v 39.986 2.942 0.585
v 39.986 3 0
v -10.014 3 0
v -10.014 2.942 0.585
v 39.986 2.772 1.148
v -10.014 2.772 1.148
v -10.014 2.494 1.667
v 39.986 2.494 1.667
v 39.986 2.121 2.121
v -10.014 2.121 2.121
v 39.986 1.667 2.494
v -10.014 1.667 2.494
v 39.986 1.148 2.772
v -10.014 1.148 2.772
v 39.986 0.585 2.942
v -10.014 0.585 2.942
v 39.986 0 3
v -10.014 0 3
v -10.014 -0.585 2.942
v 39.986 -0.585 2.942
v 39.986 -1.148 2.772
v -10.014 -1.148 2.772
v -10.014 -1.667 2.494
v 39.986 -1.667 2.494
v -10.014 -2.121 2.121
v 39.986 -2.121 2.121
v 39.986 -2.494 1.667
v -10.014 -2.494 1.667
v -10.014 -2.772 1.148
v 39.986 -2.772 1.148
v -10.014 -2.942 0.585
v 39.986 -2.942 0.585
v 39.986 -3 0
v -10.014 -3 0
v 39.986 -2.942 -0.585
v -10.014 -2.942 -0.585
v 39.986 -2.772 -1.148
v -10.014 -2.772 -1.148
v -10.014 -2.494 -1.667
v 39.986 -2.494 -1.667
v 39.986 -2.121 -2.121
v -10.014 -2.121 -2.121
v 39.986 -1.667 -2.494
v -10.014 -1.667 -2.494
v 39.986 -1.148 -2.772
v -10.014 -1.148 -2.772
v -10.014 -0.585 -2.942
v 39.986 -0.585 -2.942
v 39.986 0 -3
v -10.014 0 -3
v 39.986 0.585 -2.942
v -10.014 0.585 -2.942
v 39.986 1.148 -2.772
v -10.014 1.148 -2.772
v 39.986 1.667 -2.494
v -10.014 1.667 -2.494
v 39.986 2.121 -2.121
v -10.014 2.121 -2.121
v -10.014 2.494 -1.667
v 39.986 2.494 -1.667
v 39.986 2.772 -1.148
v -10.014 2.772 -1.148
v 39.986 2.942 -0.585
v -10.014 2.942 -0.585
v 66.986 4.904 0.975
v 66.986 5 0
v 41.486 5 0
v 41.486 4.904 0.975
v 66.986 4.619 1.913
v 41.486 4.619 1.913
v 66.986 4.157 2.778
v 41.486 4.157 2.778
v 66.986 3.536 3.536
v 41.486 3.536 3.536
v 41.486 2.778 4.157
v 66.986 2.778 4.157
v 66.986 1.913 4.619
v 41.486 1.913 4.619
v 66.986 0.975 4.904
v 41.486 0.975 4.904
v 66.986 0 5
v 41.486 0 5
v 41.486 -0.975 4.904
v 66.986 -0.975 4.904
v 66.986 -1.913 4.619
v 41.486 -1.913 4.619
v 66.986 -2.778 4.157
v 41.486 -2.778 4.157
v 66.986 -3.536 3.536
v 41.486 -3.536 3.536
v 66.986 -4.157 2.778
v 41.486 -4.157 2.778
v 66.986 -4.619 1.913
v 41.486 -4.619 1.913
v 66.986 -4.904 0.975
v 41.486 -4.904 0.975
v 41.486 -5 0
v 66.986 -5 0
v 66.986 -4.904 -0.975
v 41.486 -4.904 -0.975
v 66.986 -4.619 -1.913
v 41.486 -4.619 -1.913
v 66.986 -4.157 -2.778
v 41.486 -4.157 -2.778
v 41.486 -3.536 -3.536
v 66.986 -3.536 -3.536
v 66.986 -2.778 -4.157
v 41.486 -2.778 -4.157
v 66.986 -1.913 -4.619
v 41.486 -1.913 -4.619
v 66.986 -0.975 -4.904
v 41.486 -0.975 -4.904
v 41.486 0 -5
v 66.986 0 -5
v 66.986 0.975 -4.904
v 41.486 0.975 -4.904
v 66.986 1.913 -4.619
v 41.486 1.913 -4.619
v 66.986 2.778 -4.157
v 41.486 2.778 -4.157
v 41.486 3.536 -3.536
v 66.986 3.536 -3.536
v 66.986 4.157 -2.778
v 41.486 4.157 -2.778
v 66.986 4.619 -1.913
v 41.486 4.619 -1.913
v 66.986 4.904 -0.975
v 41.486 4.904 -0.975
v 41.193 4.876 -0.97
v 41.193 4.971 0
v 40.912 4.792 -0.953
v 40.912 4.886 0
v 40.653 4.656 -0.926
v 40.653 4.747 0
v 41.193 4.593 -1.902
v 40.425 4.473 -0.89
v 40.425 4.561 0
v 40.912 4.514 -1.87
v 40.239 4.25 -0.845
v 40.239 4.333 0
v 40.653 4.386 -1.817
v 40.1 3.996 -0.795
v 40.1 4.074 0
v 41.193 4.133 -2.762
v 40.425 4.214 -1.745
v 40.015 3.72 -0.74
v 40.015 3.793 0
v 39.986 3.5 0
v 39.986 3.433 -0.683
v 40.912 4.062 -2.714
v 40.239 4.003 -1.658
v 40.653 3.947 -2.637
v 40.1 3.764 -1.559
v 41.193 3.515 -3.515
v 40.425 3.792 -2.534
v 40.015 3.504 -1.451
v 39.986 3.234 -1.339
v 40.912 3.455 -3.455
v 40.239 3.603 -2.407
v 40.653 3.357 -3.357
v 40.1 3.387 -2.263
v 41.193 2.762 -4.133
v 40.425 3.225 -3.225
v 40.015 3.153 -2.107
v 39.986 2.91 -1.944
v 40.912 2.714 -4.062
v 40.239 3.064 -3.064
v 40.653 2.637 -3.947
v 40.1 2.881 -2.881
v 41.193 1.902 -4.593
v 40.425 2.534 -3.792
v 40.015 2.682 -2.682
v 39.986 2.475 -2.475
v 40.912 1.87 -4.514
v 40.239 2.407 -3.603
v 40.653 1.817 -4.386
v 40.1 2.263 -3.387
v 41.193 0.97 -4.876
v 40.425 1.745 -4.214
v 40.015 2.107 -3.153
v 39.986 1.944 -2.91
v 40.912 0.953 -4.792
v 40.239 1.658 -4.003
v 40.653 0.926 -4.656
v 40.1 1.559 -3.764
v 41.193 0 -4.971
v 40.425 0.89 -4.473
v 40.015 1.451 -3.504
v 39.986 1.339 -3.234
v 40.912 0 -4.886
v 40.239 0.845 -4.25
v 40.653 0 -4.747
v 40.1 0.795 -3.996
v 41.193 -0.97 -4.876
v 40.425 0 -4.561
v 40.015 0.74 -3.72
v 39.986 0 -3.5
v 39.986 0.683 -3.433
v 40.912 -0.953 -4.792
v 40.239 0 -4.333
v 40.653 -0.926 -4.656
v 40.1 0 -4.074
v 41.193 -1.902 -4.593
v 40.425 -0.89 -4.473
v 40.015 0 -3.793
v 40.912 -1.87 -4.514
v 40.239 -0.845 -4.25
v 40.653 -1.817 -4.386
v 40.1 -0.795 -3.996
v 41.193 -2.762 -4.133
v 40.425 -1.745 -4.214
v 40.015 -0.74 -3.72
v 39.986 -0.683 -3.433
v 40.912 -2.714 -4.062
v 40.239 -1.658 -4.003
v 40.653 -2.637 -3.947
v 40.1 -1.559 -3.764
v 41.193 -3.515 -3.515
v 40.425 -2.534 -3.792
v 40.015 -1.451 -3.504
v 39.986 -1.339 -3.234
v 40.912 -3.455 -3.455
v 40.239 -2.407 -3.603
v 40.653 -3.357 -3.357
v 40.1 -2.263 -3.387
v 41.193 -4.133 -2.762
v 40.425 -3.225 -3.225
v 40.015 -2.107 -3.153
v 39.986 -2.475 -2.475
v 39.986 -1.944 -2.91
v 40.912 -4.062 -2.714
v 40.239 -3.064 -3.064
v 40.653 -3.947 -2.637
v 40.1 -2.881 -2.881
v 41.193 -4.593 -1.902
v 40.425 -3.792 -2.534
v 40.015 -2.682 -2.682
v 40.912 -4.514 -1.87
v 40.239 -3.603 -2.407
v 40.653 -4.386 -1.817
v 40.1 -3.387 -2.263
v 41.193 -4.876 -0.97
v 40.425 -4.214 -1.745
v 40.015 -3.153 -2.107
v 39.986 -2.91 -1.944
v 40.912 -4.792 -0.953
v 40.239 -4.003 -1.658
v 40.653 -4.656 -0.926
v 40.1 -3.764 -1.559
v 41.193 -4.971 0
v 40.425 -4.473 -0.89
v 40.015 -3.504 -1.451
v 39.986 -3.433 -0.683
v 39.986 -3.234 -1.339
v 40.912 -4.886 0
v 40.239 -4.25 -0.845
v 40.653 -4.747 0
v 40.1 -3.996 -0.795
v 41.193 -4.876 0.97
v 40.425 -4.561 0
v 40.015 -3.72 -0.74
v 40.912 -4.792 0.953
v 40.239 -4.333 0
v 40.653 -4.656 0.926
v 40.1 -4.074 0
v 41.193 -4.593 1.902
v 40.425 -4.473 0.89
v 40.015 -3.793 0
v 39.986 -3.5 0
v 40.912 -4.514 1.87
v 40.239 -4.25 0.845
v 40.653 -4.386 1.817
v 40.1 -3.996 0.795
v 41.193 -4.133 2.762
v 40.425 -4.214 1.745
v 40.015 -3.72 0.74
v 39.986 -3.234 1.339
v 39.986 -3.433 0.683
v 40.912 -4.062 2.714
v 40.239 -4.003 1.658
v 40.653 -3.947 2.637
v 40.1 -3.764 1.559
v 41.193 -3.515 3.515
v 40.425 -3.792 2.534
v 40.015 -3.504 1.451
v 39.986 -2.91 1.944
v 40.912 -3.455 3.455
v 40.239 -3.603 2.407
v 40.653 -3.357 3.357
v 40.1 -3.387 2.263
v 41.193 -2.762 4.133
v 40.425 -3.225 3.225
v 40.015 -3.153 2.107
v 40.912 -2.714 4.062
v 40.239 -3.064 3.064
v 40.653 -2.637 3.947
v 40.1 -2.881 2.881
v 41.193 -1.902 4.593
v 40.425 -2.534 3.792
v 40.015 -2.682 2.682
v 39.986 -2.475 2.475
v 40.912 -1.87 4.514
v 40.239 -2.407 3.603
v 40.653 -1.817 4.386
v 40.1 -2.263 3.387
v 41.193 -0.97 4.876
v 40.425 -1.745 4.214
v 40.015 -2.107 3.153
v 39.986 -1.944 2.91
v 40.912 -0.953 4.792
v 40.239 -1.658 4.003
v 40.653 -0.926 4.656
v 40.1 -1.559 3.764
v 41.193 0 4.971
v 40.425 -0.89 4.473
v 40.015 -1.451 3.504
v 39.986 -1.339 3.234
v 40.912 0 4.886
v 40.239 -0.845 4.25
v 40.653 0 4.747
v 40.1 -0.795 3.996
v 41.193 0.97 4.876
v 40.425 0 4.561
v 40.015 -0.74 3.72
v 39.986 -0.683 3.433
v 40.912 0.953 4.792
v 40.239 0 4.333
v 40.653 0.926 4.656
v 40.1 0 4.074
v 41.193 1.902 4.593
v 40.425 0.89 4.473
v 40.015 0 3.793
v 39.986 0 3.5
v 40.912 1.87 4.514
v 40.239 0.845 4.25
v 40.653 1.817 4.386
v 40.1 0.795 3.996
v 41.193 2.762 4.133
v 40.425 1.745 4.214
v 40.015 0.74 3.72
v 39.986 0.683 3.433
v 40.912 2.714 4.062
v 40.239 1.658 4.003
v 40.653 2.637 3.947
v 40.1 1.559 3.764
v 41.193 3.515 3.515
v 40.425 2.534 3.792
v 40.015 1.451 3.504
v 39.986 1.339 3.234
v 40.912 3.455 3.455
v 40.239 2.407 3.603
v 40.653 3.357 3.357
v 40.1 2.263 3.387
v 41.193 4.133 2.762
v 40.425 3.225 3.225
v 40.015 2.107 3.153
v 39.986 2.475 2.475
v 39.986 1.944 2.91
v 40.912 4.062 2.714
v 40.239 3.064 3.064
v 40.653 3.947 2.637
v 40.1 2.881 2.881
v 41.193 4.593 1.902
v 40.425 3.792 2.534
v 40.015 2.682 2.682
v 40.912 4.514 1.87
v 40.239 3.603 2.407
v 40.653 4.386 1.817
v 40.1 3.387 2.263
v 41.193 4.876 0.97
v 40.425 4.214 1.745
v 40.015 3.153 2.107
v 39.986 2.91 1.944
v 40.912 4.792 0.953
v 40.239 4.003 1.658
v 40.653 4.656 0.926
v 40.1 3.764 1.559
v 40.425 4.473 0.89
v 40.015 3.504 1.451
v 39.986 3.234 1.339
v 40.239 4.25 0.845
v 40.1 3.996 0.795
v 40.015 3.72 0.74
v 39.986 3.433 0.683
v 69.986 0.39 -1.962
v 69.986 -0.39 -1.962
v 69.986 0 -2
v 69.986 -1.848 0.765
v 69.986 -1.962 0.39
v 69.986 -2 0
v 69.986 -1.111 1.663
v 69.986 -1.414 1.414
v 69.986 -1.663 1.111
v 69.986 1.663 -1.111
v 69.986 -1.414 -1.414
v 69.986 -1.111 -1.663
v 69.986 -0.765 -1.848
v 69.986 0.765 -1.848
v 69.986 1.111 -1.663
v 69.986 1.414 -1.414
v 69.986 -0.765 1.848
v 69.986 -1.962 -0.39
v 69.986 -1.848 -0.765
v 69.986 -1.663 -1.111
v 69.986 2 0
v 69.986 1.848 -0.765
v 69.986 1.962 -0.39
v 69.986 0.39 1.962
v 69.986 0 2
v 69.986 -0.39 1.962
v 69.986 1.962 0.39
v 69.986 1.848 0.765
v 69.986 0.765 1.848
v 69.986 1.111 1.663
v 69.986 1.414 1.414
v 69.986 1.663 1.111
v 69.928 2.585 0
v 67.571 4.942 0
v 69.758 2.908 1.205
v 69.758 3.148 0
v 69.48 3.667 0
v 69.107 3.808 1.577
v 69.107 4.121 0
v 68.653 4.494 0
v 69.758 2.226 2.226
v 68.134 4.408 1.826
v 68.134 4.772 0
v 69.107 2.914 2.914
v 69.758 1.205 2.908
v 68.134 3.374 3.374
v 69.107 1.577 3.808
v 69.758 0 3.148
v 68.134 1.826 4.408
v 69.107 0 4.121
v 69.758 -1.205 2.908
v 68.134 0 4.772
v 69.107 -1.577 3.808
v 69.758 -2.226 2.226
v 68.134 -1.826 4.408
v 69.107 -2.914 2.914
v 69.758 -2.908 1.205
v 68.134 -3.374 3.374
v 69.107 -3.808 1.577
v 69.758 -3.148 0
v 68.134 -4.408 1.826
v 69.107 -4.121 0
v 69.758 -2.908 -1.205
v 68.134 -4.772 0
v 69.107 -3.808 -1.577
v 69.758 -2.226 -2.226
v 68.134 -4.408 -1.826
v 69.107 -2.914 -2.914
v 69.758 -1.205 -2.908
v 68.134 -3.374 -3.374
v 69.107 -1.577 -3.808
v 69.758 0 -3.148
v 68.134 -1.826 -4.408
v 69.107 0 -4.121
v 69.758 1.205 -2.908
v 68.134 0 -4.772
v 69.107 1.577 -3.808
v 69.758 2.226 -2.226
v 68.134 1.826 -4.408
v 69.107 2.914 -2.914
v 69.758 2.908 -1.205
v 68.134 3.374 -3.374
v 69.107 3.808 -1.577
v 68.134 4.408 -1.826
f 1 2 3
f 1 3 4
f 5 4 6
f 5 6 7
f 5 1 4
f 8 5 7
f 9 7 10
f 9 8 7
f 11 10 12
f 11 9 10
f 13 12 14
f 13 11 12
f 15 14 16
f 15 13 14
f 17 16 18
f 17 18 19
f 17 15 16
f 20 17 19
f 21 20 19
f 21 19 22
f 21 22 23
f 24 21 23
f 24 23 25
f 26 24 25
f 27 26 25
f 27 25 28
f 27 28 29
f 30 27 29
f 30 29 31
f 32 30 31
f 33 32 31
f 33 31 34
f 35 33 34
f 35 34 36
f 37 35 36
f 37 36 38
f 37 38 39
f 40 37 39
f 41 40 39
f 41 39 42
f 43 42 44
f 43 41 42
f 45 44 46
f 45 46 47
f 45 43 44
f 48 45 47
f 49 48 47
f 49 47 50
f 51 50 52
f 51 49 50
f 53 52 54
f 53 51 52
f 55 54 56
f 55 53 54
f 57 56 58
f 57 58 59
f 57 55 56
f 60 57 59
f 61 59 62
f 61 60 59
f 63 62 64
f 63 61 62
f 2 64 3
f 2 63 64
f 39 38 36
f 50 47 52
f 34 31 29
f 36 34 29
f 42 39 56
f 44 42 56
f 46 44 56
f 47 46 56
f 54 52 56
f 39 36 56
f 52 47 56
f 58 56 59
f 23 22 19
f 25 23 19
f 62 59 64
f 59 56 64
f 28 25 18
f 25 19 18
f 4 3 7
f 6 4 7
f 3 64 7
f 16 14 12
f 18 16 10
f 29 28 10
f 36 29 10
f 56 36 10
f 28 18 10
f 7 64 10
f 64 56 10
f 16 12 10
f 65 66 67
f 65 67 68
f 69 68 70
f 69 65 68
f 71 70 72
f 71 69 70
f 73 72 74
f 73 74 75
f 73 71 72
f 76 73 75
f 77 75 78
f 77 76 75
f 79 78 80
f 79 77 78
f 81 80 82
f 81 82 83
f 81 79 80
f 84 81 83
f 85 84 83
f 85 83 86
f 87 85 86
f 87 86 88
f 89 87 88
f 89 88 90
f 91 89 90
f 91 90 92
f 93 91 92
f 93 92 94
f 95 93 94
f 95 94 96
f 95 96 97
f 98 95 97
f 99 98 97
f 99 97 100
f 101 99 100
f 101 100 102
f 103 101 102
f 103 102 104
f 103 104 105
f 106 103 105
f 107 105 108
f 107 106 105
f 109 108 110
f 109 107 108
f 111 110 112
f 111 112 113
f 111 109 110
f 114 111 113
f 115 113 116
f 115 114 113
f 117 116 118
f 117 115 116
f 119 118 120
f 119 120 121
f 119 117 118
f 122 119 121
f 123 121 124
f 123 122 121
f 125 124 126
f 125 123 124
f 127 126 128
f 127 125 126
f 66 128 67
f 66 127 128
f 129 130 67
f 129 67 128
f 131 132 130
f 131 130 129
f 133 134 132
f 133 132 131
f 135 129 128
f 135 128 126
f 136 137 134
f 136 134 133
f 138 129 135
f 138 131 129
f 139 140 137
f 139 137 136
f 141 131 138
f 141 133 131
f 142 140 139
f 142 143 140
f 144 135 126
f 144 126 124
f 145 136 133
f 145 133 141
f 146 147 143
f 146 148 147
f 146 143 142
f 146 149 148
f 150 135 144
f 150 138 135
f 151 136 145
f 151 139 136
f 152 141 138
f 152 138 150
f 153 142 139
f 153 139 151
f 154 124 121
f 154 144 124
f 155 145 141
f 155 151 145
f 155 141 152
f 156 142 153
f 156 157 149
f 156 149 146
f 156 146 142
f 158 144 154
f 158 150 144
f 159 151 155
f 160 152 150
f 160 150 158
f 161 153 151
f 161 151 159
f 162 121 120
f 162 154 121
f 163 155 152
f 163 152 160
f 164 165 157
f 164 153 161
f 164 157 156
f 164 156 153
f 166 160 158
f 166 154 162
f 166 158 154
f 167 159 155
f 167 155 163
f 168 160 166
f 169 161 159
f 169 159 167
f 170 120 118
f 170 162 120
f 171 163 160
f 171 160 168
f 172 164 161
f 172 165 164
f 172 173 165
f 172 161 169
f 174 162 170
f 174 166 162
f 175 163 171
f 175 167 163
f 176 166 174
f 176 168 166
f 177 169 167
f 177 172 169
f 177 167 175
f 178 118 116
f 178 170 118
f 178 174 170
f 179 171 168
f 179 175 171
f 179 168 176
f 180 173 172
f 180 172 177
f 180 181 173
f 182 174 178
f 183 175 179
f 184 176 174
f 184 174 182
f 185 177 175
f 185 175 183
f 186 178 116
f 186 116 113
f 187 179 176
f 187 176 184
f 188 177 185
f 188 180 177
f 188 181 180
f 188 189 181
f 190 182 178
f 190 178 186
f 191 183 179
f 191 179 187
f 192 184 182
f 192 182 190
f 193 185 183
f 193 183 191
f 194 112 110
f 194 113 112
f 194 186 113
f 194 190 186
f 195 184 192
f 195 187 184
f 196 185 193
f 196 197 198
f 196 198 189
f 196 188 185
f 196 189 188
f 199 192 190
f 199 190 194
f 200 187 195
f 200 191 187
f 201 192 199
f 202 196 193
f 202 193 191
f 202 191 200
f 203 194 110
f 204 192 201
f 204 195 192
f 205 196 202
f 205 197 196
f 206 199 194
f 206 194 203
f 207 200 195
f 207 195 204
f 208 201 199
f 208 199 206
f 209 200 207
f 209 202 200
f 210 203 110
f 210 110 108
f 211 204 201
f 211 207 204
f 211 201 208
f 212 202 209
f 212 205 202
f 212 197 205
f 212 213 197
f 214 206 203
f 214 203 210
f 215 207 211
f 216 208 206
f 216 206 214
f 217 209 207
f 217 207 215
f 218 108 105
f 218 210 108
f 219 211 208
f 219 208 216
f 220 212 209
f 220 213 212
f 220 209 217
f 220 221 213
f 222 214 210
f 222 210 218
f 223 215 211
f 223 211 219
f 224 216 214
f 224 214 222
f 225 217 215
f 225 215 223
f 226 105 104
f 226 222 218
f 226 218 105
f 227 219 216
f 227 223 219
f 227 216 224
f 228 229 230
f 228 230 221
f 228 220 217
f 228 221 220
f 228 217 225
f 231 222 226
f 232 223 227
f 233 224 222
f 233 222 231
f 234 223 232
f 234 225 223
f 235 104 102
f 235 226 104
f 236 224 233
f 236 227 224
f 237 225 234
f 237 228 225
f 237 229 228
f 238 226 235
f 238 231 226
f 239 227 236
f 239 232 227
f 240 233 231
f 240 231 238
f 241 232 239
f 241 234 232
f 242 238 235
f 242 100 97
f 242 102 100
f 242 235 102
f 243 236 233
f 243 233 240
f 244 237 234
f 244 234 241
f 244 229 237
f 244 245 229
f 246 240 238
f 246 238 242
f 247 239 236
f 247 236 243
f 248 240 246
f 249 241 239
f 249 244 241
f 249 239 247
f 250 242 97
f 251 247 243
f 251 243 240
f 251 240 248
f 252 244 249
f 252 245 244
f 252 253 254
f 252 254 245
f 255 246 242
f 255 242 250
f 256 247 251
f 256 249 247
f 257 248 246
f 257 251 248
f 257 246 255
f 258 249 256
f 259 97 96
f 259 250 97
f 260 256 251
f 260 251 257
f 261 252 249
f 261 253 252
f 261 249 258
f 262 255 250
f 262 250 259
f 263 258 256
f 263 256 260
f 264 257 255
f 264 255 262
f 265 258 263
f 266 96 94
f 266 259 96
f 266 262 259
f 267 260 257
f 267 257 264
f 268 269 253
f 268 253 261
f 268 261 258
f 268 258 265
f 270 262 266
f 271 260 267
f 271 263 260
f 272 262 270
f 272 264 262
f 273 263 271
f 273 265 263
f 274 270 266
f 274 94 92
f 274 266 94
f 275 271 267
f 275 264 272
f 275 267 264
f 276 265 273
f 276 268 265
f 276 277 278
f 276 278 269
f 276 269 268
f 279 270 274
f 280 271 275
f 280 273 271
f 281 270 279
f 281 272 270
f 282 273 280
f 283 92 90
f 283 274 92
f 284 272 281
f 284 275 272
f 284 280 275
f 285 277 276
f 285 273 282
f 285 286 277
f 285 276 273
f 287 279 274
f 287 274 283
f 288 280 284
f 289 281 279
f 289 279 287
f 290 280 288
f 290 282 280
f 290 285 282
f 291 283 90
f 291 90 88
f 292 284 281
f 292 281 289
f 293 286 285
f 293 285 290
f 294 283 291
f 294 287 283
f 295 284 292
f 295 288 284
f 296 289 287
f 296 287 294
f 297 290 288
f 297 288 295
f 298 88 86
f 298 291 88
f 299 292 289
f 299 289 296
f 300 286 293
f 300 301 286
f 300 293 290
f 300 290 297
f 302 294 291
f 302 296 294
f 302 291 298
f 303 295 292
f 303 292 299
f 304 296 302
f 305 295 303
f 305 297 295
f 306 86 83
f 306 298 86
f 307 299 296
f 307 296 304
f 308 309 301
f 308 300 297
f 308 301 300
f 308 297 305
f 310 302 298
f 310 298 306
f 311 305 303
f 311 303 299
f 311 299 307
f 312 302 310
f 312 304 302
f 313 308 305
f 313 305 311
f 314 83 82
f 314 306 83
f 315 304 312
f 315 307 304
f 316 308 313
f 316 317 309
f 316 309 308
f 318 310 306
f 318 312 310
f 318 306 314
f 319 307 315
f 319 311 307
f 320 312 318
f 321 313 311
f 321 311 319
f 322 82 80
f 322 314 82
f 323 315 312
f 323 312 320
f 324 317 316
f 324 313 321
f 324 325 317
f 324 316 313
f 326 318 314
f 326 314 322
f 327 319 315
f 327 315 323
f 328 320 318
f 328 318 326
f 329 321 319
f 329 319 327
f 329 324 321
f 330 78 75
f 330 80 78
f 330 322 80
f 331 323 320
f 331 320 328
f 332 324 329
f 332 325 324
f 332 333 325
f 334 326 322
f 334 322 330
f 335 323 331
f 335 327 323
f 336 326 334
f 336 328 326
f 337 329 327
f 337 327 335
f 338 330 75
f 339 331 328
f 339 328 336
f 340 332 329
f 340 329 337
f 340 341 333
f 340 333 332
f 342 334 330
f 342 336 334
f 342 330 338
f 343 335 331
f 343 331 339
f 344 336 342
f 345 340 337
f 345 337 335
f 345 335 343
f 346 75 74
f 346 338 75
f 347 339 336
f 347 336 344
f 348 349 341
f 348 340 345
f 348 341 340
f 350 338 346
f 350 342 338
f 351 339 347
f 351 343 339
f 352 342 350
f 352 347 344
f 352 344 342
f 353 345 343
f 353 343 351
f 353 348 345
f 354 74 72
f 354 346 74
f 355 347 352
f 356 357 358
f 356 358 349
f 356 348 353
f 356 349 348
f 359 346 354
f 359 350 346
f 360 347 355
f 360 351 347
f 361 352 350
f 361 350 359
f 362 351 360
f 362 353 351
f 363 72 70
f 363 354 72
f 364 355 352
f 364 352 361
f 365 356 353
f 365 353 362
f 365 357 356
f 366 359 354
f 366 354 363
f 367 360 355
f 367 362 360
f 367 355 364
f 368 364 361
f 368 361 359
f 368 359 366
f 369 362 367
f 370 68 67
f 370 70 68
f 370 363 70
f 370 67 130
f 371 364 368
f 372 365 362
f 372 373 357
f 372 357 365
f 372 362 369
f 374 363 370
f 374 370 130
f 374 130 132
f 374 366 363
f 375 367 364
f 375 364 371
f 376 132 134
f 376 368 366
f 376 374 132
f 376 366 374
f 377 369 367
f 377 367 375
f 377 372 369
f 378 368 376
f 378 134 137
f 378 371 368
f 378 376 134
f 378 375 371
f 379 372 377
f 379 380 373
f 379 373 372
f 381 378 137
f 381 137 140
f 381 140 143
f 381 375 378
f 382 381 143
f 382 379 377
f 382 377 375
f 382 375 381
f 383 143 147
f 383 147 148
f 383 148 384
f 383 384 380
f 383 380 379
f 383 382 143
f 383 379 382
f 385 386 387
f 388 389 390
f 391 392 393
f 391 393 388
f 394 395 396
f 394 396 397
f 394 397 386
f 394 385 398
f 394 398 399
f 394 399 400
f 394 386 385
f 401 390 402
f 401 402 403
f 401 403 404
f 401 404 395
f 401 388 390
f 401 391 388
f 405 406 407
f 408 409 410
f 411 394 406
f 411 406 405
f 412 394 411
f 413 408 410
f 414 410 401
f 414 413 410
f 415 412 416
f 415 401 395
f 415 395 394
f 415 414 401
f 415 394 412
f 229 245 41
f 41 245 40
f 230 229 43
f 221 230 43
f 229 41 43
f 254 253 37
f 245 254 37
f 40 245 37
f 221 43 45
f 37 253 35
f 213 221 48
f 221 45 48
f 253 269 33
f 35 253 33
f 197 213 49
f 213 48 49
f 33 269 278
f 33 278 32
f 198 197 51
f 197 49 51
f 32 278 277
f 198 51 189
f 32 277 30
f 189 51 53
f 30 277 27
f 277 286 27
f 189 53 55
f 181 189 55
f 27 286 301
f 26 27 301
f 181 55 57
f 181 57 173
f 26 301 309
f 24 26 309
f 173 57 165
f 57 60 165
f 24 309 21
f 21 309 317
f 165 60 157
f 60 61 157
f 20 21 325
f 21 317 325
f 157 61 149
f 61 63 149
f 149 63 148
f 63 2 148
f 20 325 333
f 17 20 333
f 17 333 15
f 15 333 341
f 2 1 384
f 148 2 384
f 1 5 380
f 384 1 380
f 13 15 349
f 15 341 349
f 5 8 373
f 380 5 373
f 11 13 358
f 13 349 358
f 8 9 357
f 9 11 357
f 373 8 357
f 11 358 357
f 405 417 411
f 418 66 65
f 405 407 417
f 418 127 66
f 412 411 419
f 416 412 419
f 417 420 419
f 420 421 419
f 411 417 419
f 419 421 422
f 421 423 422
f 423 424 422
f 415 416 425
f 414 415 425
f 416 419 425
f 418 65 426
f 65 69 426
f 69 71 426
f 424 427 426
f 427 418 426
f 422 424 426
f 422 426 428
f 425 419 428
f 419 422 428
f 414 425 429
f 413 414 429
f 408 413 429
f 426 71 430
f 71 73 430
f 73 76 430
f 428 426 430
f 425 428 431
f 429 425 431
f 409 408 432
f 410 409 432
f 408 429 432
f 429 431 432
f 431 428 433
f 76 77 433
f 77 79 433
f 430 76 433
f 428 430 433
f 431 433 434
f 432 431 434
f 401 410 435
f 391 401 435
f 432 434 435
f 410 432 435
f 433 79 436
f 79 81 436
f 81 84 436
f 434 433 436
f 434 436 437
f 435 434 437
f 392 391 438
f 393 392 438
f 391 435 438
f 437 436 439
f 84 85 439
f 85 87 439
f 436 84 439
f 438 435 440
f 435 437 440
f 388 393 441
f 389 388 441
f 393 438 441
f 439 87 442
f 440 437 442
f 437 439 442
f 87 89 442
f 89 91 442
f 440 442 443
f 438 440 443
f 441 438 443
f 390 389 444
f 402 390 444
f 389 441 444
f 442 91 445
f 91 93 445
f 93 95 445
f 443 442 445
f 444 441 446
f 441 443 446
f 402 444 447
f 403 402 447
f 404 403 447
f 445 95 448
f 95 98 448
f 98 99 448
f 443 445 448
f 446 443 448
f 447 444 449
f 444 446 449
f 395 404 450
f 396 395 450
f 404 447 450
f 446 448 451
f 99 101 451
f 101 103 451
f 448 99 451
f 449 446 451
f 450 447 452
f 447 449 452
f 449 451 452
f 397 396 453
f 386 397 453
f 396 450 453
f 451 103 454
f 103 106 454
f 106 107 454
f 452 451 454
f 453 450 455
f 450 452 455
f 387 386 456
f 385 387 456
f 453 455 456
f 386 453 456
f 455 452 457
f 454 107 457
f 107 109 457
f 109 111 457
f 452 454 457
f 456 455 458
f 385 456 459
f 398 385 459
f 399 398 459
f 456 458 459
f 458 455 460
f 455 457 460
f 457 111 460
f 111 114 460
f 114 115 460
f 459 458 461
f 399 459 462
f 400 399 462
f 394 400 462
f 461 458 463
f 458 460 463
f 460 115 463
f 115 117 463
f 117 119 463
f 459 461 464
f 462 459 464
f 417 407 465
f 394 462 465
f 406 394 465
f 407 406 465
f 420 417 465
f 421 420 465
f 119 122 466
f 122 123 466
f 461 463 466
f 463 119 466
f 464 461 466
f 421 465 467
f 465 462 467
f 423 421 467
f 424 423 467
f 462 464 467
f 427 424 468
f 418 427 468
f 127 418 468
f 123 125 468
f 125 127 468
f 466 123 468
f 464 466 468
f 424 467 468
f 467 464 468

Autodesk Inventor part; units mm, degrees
ref_plane "YZ Plane" through (0, 0, 0) normal (1, 0, 0) x (0, 1, 0)
ref_plane "XZ Plane" through (0, 0, 0) normal (0, 1, 0) x (-1, 0, 0)
ref_plane "XY Plane" through (0, 0, 0) normal (0, 0, 1) x (1, 0, 0)
sketch "Sketch1" plane through (0, 0, 0) normal (0, 0, 1) x (1, 0, 0)
  line L0 (-10.014, 0) -> (-10.014, 3)
  line L1 (-10.014, 3) -> (39.986, 3)
  line L2 (39.986, 3) -> (39.986, 3.5)
  line L3 (41.486, 5) -> (66.986, 5)
  line L4 (69.986, 2) -> (69.986, 0)
  arc A0 (41.486, 5) -> (39.986, 3.5) centre (41.486, 3.5) ccw
  arc A1 (69.986, 2) -> (66.986, 5) centre (66.986, 2) ccw
  line L5 (-10.014, 0) -> (69.986, 0)
  point P0 (0, 0)
  point P1 (39.986, 5)
  point P2 (69.986, 5)
  dimension "d0" = 3
  dimension "d1" = 50
  dimension "d2" = 2
  dimension "d3" = 30
  dimension "d4" = 1.5
  dimension "d5" = 3
revolve "Revolution1" add sketch "Sketch1" angle 360 about axis through (-10.014, 0, 0) along (1, 0, 0)
properties part number "ocas" material "Wood (Birch)"
